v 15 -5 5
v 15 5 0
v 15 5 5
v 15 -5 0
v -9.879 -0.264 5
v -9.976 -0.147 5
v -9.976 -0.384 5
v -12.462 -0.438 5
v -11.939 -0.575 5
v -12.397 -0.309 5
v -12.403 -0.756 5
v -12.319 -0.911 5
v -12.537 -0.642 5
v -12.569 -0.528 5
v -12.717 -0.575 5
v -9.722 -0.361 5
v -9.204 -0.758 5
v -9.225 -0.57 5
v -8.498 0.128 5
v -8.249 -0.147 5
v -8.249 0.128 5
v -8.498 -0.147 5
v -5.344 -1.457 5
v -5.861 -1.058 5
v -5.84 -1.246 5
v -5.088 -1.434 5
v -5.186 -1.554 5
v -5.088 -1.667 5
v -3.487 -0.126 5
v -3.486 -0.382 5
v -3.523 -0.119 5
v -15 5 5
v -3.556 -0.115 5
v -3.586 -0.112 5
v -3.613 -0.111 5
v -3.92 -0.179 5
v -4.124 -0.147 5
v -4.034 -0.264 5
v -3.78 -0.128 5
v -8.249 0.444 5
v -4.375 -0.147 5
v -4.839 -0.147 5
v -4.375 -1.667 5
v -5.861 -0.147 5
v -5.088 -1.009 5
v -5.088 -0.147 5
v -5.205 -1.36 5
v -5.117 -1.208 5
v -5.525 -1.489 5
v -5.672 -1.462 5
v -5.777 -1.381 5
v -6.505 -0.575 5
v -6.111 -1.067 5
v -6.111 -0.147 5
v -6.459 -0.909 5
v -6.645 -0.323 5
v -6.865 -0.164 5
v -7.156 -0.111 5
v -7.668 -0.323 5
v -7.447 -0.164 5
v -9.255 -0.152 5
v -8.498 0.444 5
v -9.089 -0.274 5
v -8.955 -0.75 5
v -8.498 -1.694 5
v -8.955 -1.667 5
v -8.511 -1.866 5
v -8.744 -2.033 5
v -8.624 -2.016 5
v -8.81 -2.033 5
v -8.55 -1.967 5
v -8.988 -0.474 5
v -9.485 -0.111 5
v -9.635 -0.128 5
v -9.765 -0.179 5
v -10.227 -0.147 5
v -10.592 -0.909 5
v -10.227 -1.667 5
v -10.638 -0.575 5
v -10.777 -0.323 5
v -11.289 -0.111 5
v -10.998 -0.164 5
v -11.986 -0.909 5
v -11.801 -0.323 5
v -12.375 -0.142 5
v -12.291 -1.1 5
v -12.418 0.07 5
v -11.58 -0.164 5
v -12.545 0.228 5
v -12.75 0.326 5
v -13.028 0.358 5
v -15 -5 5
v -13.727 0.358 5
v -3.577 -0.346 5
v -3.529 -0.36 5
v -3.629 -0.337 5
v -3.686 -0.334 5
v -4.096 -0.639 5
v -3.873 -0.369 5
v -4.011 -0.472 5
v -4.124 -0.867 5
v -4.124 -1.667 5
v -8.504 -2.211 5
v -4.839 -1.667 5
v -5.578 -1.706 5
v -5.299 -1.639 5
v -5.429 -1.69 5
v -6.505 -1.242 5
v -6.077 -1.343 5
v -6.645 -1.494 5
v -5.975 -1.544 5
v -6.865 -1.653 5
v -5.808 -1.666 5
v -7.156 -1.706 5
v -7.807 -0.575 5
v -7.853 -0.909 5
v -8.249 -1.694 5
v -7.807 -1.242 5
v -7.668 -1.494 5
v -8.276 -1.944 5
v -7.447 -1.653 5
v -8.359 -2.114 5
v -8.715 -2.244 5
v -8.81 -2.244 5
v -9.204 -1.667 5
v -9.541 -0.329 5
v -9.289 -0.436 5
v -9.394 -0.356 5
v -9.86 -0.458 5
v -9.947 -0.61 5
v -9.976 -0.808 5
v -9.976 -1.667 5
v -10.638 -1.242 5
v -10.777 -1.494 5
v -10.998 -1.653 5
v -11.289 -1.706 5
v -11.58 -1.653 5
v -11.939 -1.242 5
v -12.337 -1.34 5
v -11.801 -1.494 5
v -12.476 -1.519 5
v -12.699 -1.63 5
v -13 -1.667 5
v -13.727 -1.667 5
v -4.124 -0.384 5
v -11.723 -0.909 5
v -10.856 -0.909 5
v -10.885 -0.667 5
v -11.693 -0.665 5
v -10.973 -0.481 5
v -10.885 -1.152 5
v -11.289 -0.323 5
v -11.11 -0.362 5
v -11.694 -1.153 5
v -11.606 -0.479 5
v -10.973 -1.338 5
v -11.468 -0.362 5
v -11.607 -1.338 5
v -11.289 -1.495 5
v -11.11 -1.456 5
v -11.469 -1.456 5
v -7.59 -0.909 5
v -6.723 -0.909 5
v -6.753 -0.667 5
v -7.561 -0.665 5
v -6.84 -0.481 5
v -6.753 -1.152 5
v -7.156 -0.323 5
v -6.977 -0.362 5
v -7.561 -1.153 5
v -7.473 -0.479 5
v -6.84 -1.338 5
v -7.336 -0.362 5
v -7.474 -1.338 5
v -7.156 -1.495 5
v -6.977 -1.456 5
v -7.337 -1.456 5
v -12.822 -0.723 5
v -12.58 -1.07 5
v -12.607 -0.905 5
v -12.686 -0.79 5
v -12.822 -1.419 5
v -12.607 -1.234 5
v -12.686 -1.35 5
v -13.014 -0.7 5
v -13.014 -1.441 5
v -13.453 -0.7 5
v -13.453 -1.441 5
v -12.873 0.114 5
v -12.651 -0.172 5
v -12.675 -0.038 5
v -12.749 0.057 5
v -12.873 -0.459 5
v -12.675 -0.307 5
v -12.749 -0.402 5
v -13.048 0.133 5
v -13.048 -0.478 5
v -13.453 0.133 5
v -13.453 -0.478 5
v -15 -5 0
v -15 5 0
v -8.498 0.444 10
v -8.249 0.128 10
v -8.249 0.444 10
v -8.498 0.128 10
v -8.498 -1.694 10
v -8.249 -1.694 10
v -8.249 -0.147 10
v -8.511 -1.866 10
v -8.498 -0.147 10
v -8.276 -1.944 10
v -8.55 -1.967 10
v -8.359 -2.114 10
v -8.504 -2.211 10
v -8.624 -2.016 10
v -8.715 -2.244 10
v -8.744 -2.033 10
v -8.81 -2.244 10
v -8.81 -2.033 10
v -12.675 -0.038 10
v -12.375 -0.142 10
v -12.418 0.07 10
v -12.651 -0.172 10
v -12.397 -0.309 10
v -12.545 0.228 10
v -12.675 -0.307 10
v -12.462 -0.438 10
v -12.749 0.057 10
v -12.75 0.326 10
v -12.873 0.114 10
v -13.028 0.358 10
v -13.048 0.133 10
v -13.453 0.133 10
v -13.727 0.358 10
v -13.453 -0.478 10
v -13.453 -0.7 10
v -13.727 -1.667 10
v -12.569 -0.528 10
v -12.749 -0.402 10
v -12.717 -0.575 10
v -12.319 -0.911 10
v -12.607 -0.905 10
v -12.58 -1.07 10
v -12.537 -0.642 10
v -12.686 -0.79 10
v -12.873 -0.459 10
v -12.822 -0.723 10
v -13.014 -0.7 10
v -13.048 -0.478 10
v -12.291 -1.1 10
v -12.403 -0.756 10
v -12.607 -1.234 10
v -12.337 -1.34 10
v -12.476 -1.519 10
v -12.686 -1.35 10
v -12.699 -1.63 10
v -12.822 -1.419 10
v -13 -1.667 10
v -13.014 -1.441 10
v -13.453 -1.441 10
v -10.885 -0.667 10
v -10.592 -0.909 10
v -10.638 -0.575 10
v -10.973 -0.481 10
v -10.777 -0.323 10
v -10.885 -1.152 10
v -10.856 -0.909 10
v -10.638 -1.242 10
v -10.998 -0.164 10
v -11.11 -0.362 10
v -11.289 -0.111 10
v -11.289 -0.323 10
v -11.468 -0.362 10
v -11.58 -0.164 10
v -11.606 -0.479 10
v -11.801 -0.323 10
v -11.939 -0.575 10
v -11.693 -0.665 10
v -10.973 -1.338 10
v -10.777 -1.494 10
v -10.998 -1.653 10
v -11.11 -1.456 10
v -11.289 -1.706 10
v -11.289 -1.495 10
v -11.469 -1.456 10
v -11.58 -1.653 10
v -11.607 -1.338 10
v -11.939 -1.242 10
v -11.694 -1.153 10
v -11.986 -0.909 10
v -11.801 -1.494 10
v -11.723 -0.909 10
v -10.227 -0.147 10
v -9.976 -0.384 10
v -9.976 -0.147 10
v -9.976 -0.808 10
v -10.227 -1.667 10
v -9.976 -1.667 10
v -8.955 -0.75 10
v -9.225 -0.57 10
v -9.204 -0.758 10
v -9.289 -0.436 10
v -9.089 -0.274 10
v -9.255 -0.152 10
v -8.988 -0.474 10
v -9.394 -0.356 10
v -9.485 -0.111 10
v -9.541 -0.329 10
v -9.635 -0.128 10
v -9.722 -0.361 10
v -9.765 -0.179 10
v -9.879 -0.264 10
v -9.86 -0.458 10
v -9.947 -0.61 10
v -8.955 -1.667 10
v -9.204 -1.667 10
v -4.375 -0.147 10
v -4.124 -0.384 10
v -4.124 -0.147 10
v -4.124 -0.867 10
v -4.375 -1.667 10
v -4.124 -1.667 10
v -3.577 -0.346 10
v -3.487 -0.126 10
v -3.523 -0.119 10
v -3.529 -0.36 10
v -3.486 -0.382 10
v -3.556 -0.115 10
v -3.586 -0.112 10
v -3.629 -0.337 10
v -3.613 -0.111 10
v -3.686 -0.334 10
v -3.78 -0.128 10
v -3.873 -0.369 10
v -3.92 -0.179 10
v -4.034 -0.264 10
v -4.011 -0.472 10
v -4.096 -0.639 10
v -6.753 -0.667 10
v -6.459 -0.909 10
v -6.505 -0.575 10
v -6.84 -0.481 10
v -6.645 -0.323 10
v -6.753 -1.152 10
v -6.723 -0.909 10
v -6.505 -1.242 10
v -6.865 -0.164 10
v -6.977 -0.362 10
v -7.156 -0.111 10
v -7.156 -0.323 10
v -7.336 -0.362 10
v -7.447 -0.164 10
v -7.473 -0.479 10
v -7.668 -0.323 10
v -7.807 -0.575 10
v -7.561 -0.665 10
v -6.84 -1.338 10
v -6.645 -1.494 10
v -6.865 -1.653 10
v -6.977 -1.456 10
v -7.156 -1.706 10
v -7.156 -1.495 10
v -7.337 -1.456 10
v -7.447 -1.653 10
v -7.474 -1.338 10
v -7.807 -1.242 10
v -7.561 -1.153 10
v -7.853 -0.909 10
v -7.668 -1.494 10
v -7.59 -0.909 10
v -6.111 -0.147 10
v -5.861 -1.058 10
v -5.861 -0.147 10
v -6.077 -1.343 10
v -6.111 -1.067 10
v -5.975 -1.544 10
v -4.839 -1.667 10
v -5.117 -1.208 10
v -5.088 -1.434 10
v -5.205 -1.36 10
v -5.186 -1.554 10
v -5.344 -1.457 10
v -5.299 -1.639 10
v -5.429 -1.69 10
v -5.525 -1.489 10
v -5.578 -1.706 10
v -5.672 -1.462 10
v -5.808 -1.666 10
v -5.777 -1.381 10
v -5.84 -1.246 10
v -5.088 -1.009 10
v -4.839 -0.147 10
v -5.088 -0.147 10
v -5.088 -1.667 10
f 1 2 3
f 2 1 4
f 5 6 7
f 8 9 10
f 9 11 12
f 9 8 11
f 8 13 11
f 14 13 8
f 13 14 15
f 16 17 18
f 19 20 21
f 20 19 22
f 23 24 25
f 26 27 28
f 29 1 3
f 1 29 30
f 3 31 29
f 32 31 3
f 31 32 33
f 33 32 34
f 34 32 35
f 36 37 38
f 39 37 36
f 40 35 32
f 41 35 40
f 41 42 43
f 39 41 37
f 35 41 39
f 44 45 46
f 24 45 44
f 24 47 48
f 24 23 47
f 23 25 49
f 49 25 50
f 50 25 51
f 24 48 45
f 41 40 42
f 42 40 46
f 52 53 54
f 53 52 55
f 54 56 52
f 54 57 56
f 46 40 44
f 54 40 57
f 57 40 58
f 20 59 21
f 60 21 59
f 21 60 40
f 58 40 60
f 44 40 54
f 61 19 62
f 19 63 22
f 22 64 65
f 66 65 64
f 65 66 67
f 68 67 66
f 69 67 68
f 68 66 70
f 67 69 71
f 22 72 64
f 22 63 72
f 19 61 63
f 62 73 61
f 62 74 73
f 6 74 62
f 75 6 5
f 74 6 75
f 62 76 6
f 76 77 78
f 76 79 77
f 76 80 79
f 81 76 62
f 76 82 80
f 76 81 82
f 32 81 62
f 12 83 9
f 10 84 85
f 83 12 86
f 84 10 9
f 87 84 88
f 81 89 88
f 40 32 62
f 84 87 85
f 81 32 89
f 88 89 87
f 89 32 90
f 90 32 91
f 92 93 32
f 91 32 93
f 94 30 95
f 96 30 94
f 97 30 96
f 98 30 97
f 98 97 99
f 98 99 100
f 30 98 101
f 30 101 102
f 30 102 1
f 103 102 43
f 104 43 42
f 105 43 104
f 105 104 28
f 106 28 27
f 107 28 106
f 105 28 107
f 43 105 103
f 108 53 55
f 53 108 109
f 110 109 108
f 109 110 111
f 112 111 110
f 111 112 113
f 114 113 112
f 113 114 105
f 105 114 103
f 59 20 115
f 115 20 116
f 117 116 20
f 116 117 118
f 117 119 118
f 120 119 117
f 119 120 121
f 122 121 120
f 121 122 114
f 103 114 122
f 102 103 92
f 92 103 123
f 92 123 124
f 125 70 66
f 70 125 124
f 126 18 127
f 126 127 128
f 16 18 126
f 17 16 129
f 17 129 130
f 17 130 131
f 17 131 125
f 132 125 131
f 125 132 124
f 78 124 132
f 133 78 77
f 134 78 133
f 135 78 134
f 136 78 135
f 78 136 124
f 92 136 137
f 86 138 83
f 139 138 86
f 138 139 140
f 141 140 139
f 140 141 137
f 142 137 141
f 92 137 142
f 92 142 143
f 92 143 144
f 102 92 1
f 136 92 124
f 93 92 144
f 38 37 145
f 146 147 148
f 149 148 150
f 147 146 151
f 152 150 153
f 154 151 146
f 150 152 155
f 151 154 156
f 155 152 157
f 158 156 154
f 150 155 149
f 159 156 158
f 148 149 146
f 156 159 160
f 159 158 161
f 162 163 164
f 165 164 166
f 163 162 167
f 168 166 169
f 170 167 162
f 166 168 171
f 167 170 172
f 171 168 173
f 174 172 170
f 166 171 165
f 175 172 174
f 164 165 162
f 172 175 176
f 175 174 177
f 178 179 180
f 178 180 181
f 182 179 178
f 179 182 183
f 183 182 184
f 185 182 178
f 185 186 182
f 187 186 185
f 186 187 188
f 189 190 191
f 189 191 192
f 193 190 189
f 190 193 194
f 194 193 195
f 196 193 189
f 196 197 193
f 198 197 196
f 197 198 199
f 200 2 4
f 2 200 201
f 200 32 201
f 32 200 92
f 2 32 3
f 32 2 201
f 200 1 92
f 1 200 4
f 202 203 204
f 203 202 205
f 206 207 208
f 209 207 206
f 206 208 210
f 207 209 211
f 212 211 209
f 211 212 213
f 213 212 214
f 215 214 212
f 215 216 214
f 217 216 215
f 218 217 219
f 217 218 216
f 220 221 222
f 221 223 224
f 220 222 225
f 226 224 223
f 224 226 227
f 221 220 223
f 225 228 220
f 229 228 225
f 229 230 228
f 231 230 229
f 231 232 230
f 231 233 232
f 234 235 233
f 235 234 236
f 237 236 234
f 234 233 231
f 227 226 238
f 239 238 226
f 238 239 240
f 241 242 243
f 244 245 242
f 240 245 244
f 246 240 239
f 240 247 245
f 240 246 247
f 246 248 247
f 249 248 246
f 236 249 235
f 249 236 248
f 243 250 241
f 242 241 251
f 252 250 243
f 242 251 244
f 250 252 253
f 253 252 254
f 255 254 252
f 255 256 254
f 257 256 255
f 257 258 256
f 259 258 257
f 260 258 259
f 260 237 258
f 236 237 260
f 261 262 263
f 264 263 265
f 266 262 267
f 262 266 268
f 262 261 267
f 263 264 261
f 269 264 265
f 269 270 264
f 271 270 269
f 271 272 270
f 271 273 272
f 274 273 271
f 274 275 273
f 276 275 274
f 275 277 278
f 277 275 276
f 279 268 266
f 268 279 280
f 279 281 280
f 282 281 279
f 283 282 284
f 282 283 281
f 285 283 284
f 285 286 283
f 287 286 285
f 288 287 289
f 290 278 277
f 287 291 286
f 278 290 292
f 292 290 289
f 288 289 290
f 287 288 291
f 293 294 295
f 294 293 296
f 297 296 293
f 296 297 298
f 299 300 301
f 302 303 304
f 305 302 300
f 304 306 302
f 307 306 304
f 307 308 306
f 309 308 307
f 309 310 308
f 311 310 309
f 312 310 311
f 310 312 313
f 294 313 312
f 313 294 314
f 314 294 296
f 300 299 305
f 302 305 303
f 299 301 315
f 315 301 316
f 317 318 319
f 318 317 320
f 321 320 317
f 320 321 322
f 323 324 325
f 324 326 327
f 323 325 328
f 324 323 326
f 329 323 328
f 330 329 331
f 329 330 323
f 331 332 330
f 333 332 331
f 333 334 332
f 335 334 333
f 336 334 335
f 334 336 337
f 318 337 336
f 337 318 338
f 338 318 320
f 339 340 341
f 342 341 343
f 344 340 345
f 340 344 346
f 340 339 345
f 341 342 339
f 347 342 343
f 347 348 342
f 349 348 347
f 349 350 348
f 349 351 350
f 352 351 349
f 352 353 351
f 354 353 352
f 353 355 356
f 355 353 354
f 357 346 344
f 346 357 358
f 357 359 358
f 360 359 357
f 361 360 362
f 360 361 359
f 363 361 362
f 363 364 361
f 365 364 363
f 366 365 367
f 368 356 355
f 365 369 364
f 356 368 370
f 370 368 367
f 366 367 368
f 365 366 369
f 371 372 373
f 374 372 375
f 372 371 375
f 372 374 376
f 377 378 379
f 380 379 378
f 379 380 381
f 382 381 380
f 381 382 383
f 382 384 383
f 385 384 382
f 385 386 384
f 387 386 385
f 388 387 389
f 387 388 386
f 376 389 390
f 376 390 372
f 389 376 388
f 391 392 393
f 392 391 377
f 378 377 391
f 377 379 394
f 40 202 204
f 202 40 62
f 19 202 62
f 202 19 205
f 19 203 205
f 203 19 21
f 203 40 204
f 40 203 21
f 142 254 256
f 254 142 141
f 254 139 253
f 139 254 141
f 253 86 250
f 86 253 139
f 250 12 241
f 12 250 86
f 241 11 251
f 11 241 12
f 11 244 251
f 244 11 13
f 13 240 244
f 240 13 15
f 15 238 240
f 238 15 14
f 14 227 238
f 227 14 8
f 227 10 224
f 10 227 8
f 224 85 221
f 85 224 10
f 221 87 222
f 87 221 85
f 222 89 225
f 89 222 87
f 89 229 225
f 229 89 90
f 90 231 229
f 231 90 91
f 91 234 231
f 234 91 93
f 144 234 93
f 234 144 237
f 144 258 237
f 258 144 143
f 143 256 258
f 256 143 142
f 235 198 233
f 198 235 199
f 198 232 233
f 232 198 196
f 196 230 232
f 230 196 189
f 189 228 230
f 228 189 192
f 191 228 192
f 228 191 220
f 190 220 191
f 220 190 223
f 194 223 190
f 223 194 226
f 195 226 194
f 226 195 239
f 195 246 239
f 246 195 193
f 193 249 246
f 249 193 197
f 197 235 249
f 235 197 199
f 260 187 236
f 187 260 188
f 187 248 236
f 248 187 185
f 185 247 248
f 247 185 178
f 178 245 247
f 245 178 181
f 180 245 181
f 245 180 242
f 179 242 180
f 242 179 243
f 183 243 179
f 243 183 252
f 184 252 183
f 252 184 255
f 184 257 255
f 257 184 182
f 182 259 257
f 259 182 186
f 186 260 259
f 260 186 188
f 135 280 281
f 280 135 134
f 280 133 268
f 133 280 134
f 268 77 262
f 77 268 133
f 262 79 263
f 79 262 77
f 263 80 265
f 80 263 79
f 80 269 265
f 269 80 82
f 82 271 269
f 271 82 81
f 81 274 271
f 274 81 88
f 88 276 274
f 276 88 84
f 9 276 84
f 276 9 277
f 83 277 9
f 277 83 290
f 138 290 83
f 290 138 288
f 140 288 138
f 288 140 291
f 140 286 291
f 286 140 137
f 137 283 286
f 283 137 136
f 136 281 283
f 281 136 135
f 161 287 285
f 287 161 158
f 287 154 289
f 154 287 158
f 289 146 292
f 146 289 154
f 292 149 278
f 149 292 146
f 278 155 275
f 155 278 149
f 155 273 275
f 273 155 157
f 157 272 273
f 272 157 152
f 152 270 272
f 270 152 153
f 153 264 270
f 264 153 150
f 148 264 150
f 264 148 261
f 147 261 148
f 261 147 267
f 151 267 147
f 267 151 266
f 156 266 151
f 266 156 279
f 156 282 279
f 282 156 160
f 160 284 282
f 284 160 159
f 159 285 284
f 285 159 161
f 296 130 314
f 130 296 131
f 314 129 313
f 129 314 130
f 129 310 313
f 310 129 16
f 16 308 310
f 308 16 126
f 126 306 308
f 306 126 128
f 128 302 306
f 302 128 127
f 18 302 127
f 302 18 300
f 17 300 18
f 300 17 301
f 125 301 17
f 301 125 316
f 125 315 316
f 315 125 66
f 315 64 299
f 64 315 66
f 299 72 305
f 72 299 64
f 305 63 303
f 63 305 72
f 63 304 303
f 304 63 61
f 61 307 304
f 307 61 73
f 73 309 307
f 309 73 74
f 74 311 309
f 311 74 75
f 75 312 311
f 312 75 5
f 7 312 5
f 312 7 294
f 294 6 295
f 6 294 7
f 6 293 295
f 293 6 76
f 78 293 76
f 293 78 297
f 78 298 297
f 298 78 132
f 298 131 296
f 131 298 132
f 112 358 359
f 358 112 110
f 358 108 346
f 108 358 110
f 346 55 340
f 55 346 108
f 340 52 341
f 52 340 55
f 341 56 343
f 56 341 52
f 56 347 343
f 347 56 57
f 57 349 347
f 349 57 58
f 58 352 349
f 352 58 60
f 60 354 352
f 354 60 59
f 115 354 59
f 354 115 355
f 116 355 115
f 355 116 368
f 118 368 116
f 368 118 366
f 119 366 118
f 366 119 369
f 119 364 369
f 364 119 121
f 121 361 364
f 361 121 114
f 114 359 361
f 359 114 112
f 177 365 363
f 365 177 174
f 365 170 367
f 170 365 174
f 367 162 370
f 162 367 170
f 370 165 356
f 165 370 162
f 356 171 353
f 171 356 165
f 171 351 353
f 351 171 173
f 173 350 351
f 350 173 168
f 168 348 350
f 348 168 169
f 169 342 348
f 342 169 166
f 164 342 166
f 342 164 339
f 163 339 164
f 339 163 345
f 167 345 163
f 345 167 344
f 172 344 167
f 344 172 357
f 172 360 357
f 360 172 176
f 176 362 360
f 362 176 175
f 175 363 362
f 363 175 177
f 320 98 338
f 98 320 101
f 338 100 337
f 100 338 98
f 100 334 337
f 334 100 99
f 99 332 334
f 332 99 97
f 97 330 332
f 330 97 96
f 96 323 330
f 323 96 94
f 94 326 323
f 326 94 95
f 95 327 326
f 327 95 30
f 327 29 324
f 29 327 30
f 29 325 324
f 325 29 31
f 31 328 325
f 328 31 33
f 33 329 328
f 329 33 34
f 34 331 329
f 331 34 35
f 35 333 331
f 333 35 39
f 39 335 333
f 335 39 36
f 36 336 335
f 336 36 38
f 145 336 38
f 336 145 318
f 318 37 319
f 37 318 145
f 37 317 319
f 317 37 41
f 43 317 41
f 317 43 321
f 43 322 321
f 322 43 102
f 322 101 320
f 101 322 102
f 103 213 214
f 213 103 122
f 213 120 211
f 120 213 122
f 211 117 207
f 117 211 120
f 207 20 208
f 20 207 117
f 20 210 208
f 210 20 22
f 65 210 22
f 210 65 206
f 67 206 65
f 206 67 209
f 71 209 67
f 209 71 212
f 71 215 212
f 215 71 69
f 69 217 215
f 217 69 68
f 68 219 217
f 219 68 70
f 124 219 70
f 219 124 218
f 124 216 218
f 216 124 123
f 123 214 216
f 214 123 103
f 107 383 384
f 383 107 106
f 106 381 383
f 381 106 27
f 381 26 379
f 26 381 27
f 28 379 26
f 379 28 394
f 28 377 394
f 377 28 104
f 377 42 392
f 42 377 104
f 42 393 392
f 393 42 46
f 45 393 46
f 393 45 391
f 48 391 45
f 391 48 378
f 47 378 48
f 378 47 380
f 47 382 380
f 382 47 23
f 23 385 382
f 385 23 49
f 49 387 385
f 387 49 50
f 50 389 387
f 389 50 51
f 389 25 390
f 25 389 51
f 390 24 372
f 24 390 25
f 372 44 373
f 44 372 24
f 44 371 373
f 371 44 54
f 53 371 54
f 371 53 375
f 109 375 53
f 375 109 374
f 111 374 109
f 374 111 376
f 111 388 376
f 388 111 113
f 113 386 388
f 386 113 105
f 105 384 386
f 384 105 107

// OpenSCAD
$fn = 3; 
texte_a_inserer = "Bonjour"; 
taille = 2; 
police = "DejaVuSans"; //[[Abril Fatface,Aclonica,Acme,Advent Pro,Akronim,Aladin,Alegreya,Alegreya Sans,Alegreya SC,Alex Brush,Alfa Slab One,Alice,Amaranth,Architects Daughter,Archivo Black,Archivo Narrow,Arimo,Arvo,Asap,Astloch,Asul,Averia Libre,Averia Serif Libre,Bangers,Basic,Belgrano,Berkshire Swash,Bigshot One,Bilbo Swash Caps,Black Ops One,Bonbon,Bowlby One SC,Brawler,Bubblegum Sans,Butterfly Kids,Cabin Condensed,Caesar Dressing,Cagliostro,Calligraffitti,Capriola,Carter One,Changa One,Chango,Chelsea Market,Cherry Cream Soda,Chewy,Chicle,Chivo,Clicker Script,Coming Soon,Concert One,Condiment,Cookie,Courgette,Covered By Your Grace,Crimson Text,Dancing Script,DejaVu Sans,DejaVu Serif,Dhurjati,Doppio One,Dosis,Droid Sans,Eagle Lake,Electrolize,Emilys Candy,Encode Sans,Encode Sans Compressed,Euphoria Script,Exo,Exo 2,Faster One,Federo,Finger Paint,Fjord One,Fontdiner Swanky,Freckle Face,Fruktur,Gabriela,Geo,Germania One,Give You Glory,Gloria Hallelujah,Goudy Bookletter 1911,Graduate,Grand Hotel,Great Vibes,Griffy,Hanalei Fill,Happy Monkey,Henny Penny,Hind,IM Fell English SC,Indie Flower,Irish Grover,Italianno,Jacques Francois Shadow,Jolly Lodger,Josefin Slab,Joti One,Judson,Just Another Hand,Kalam,Kameron,Karma,Kavoon,Knewave,Kranky,Kristi,Laila,Lakki Reddy,Lancelot,Lato,Leckerli One,Ledger,Lekton,Lemon One,Liberation Sans,Libre Caslon Text,Life Savers,Lilita One,Lily Script One,Limelight,Lobster,Lobster Two,Londrina Outline,Londrina Shadow,Londrina Solid,Lora,Love Ya Like A Sister,Loved by the King,Lovers Quarrel,Luckiest Guy,Lusitana,Macondo,Macondo Swash Caps,Mako,Marck Script,Margarine,Marko One,Maven Pro,McLaren,MedievalSharp,Merienda One,Merriweather,Mervale Script,Metal Mania,Metrophobic,Milonga,Miltonian Tattoo,Miss Fajardose,Molle,Montez,Montserrat,Mr De Haviland,Mystery Quest,Neucha,New Rocker,Niconne,Nosifer,Nothing You Could Do,Noto Sans Oriya,Noto Serif,Nova Square,Nunito,Old Standard TT,Oleo Script,Oleo Script Swash Caps,Orbitron,Oregano,Orienta,Original Surfer,Oswald,Over the Rainbow,Overlock,Oxygen,Pacifico,Paprika,Parisienne,Patrick Hand SC,Paytone One,Peralta,Permanent Marker,Piedra,Pirata One,Play,Playball,Poetsen One,Poppins,Press Start 2P,Princess Sofia,PT Mono,Qwigley,Racing Sans One,Raleway,Rancho,Ranga,Ribeye,Roboto,Roboto Condensed,Roboto Slab,Rochester,Rock Salt,Rubik One,Sail,Salsa,Sansita One,Sarina,Satisfy,Schoolbell,Seaweed Script,Sevillana,Shadows Into Light,Shadows Into Light Two,Share,Six Caps,Skranji,Source Sans Pro,Spicy Rice,Stardos Stencil,Stoke,Syncopate,Teko,Terminal Dosis,The Girl Next Door,Tillana,Timmana,Titillium Web,Ubuntu,Ultra,Underdog,UnifrakturCook,UnifrakturMaguntia,Vampiro One,Vidaloka,Viga,Voces,Volkhov,Vollkorn,Voltaire,Waiting for the Sunrise,Wallpoet,Wellfleet,Wendy One,Yellowtail,Yesteryear,Zeyada]]
hauteur = 5; 
longueur_cube = 30; 
largeur_cube = 10; 
hauteur_cube = 5; 
relief_extrusion = "relief"; //[relief,extru]
module rendu(){
linear_extrude(hauteur) text(texte_a_inserer,size = taille, font = police);
}
module finao(){
if ( relief_extrusion == "relief") {
   union(){
 translate([0,0,0])   cube([longueur_cube,largeur_cube,hauteur_cube]);
translate([1,(largeur_cube/3),hauteur_cube]) rendu();
   } 
}
else
{
difference(){
 translate([0,0,0])   cube([longueur_cube,largeur_cube,hauteur_cube]);
translate([1,(largeur_cube/3),(hauteur_cube -hauteur+0.1)]) rendu();
}
 }
}
translate ([-(longueur_cube/2),-(largeur_cube/2),0]) finao();
